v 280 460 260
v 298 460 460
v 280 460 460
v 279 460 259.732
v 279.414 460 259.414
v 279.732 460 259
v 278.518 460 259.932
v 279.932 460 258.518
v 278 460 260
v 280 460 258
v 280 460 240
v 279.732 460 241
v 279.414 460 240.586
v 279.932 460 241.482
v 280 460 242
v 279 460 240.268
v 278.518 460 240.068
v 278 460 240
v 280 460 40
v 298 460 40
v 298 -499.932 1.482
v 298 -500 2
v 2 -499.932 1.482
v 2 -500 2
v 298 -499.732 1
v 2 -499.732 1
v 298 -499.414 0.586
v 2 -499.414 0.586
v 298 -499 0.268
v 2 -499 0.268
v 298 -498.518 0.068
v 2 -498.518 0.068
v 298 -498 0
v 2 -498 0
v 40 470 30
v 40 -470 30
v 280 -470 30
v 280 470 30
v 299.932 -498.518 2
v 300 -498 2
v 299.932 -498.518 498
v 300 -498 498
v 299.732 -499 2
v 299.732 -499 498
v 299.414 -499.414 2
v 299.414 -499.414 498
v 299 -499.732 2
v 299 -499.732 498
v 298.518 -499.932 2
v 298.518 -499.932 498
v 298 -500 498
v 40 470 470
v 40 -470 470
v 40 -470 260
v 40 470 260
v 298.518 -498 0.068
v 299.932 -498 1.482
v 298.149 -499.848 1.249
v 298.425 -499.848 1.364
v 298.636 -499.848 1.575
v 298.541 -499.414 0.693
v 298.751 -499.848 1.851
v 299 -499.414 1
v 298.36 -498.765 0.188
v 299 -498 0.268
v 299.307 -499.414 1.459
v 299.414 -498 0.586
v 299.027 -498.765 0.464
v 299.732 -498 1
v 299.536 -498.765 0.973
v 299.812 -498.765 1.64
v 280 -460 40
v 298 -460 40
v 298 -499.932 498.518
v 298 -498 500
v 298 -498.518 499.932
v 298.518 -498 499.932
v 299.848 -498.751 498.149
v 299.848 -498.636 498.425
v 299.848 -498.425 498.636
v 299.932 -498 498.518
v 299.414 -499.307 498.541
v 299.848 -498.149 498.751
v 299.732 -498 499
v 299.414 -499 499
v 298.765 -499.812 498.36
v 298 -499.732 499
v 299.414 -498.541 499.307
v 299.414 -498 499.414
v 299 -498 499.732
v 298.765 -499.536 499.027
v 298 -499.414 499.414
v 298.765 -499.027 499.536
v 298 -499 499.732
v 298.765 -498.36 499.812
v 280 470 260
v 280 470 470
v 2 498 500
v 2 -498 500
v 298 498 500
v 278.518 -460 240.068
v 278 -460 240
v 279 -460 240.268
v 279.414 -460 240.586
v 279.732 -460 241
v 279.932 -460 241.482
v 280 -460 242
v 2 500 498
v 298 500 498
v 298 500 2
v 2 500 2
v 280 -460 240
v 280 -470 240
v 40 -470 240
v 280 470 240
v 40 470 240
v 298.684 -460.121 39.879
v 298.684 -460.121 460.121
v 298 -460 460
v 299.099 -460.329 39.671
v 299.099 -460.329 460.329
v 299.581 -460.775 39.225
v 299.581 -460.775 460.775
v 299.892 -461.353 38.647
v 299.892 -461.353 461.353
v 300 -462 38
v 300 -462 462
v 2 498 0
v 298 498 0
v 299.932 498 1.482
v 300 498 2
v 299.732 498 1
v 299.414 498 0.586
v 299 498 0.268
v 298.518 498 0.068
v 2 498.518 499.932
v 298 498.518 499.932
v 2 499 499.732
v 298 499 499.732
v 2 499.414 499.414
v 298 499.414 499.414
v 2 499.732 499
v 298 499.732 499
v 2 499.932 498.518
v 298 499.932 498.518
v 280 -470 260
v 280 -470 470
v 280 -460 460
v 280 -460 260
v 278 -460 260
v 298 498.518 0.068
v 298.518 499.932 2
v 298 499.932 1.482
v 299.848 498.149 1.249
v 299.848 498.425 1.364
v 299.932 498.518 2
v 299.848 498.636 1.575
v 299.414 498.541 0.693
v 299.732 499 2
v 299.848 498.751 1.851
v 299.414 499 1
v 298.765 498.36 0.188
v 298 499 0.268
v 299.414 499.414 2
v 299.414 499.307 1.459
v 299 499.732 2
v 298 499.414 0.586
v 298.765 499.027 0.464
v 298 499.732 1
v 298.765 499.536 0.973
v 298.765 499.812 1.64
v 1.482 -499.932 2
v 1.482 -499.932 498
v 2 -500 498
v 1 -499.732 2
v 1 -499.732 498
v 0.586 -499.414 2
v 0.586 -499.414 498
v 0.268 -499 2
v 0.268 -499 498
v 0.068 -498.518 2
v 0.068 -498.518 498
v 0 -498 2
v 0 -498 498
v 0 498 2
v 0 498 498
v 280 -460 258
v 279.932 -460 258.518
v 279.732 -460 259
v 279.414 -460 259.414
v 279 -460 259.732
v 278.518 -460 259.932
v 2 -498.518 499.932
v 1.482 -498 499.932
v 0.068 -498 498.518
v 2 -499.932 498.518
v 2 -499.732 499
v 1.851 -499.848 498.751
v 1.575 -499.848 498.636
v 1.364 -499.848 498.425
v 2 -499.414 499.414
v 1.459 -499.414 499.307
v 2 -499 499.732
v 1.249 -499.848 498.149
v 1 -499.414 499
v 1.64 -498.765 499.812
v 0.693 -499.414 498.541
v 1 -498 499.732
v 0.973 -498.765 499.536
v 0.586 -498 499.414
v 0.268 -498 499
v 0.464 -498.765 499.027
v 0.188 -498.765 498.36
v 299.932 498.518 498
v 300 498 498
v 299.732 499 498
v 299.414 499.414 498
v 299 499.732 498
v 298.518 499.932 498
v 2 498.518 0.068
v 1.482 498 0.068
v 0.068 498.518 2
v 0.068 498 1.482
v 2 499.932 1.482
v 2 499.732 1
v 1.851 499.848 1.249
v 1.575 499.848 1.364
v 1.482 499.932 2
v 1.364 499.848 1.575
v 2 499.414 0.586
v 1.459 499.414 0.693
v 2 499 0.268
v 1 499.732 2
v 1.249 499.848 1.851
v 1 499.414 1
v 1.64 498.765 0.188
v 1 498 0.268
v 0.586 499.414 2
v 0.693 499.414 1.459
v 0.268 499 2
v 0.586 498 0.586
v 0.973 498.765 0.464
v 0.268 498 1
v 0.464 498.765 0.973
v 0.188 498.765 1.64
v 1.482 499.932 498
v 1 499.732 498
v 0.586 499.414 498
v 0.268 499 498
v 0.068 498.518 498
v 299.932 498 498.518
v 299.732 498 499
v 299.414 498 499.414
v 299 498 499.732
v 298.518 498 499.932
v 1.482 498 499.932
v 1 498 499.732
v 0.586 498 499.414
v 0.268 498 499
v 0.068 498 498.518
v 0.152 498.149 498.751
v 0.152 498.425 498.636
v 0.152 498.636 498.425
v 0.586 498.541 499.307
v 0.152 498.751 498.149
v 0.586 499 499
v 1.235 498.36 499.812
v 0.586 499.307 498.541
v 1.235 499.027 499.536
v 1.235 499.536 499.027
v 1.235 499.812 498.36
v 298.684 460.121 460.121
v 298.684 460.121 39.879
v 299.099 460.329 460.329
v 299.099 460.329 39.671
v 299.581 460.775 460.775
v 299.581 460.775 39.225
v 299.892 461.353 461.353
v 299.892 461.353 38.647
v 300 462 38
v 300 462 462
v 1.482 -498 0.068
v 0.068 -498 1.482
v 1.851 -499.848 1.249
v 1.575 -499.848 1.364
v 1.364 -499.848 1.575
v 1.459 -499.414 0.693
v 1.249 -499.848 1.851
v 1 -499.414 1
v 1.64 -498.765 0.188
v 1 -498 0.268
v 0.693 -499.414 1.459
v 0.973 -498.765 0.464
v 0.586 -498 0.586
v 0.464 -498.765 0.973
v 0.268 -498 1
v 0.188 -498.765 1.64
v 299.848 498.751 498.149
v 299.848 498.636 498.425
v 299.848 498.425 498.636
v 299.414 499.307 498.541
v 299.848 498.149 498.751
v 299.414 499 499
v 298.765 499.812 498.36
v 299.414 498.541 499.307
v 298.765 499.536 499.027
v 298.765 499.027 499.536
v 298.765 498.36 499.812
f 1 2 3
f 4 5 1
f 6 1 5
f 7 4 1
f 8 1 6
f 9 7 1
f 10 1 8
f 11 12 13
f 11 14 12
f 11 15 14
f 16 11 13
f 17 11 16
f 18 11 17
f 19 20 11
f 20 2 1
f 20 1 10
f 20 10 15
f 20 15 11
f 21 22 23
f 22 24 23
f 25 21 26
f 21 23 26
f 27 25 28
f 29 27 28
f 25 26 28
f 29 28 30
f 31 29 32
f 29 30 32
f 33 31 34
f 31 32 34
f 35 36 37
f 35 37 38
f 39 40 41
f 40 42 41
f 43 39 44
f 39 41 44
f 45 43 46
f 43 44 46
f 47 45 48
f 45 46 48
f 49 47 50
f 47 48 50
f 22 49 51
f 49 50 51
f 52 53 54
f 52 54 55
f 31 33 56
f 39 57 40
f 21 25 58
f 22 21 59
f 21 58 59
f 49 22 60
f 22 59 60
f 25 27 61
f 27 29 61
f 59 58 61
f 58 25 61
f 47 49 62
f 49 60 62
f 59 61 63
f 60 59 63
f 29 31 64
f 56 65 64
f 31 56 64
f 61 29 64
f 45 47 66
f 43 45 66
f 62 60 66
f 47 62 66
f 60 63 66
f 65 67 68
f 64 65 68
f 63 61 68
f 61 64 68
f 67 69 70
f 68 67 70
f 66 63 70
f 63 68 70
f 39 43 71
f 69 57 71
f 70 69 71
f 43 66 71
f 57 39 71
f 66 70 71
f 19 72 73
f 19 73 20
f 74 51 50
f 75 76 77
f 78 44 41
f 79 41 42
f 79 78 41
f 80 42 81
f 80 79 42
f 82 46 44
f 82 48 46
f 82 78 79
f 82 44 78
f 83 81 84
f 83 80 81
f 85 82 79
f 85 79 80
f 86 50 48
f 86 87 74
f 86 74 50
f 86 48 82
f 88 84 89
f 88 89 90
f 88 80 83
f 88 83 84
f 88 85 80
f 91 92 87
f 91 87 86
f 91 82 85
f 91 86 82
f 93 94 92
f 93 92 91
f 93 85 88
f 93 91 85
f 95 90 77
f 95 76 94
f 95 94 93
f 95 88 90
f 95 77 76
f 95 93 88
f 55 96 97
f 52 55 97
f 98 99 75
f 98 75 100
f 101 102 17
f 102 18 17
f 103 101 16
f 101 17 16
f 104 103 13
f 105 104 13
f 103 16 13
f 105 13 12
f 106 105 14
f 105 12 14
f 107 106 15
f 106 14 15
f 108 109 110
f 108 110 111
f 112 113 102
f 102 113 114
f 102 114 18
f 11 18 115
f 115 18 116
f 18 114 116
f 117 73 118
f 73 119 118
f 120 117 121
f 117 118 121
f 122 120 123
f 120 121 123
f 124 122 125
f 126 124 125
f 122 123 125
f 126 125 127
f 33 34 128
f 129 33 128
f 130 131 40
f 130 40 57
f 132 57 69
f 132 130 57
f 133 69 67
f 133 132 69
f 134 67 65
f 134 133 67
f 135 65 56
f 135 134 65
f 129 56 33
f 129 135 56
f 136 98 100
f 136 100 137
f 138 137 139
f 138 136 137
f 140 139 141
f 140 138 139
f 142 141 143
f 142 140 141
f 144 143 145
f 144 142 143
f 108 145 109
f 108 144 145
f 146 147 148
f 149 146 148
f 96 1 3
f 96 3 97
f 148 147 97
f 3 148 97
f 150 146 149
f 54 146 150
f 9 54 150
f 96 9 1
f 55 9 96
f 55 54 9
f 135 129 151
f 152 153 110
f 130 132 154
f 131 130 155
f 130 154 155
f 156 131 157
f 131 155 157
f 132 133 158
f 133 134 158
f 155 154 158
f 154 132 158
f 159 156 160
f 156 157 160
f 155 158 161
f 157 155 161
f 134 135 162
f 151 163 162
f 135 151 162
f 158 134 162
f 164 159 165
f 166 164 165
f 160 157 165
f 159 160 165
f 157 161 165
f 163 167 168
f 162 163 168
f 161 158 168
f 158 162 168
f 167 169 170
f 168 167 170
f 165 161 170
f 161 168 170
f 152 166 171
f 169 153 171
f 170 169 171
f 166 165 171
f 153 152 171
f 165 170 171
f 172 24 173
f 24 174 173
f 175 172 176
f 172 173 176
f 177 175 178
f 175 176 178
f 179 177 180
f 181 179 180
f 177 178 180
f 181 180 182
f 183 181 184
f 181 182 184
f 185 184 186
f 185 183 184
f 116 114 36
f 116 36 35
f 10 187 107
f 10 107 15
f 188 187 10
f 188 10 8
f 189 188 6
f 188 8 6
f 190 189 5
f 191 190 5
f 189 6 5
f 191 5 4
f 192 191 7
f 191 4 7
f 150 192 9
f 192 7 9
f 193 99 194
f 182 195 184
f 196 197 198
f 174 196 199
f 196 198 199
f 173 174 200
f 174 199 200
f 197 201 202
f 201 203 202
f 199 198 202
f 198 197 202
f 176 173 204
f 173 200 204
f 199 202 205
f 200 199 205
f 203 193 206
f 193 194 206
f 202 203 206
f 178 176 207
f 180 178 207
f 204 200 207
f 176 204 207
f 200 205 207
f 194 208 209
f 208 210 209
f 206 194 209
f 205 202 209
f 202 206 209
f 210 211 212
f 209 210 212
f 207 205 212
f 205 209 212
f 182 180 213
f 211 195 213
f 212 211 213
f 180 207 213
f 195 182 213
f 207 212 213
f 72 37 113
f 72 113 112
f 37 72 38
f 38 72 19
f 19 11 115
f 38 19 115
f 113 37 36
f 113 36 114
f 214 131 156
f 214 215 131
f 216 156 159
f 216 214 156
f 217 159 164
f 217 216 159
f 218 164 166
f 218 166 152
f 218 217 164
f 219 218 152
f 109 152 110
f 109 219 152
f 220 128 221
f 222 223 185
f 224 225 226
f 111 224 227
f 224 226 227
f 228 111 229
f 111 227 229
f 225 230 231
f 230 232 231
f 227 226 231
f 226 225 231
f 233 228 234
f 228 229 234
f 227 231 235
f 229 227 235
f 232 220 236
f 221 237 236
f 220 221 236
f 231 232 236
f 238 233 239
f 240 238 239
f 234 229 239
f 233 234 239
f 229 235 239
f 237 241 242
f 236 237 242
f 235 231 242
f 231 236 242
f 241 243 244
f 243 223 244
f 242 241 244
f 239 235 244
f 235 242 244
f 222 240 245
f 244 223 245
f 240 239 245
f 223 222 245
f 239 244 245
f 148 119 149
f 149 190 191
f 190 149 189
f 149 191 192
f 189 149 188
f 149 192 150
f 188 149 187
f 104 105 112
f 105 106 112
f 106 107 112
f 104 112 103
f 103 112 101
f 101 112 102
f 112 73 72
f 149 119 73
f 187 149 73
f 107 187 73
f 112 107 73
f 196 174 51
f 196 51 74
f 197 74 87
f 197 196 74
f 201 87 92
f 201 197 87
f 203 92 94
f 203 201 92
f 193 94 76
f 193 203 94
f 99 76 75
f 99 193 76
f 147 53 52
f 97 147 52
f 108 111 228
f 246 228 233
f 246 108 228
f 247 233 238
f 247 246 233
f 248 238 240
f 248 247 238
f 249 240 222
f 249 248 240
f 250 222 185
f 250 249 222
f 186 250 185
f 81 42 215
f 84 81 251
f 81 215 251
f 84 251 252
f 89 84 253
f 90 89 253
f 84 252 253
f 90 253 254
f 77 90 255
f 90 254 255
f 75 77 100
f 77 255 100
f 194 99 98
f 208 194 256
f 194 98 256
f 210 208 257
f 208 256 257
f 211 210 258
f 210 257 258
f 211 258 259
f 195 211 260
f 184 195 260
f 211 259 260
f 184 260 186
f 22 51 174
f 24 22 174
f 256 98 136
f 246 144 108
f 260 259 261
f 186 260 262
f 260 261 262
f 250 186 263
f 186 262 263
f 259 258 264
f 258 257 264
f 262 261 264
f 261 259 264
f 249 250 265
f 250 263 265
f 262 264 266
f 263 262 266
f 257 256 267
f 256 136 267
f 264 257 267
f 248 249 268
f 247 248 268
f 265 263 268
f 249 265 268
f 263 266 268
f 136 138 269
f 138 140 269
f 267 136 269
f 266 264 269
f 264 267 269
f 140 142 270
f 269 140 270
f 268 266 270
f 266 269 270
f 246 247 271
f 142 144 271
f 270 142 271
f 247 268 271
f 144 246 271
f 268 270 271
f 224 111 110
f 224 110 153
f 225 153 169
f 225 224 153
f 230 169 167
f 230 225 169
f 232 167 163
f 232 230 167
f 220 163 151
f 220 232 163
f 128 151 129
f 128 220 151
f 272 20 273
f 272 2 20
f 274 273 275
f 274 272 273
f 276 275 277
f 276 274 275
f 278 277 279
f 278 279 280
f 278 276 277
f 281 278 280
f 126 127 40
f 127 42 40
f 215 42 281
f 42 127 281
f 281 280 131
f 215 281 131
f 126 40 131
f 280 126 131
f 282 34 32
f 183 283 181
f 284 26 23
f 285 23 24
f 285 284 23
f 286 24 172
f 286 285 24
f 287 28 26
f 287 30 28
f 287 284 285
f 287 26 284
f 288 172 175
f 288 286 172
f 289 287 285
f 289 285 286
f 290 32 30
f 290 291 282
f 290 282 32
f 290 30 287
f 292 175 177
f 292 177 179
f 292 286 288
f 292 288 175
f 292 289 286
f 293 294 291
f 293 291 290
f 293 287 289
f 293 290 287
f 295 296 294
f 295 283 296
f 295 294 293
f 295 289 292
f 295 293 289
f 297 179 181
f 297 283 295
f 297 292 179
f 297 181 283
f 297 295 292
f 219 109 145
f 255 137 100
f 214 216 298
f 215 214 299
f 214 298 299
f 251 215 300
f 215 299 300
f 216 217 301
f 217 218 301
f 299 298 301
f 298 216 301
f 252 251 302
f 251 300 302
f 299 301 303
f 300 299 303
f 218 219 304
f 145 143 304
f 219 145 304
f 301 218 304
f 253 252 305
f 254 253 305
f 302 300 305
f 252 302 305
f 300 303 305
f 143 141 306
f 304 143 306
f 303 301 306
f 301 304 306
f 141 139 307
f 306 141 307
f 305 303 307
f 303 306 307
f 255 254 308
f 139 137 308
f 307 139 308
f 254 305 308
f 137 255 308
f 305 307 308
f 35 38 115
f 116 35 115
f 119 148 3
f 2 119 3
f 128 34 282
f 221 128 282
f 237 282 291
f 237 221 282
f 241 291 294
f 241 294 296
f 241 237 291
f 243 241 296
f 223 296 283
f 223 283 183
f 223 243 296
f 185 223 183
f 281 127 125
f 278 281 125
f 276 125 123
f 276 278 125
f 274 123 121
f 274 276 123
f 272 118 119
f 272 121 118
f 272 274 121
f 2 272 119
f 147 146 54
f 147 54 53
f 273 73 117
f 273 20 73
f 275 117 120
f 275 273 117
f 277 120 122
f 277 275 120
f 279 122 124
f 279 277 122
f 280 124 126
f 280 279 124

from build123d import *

# Parameters (mm, degrees)
SKETCH1_W           = 1000
SKETCH1_H           = 300
BOSS_EXTRUDE1_DEPTH = 500
SHELL1_T            = -40
SKETCH3_W           = 940
SKETCH3_H           = 440
CUT_EXTRUDE1_DEPTH  = 240
SKETCH4_W           = 940
SKETCH4_H           = 20
BOSS_EXTRUDE2_DEPTH = 240
FILLET1_R           = 2


with BuildPart() as part:
    # Sketch1 → Boss-Extrude1 (new body)
    with BuildSketch(Plane(origin=(0, 0, 0), x_dir=(0, 1, 0), z_dir=(0, 0, 1))):
        with Locations((0, -150)):
            Rectangle(SKETCH1_W, SKETCH1_H)
    extrude(amount=BOSS_EXTRUDE1_DEPTH)

    # Shell1
    shell1_openings = [part.faces().sort_by_distance(p)[0] for p in [
        (300, 0, 250),
    ]]
    offset(amount=SHELL1_T, openings=shell1_openings, kind=Kind.INTERSECTION)

    # Sketch3 → Cut-Extrude1 (cut)
    with BuildSketch(Plane.YZ.offset(40)):
        with Locations((0, 250)):
            Rectangle(SKETCH3_W, SKETCH3_H)
    extrude(amount=CUT_EXTRUDE1_DEPTH, mode=Mode.SUBTRACT)

    # Sketch4 → Boss-Extrude2 (add)
    with BuildSketch(Plane.YZ.offset(40)):
        with Locations((0, 250)):
            Rectangle(SKETCH4_W, SKETCH4_H)
    extrude(amount=BOSS_EXTRUDE2_DEPTH)

    # Fillet1
    fillet1_edges = [part.edges().sort_by_distance(p)[0] for p in [
        (150, 500, 500),
        (300, 0, 40),
        (300, -460, 250),
        (0, 0, 500),
        (300, 460, 250),
        (300, 0, 460),
        (150, -500, 500),
        (0, 0, 0),
        (150, 500, 0),
        (280, 0, 240),
        (280, 0, 260),
        (300, 0, 0),
        (150, -500, 0),
        (0, -500, 250),
        (0, 500, 250),
        (300, 500, 250),
        (300, -500, 250),
        (300, 0, 500),
    ]]
    fillet(fillet1_edges, radius=FILLET1_R)


solid = part.part
